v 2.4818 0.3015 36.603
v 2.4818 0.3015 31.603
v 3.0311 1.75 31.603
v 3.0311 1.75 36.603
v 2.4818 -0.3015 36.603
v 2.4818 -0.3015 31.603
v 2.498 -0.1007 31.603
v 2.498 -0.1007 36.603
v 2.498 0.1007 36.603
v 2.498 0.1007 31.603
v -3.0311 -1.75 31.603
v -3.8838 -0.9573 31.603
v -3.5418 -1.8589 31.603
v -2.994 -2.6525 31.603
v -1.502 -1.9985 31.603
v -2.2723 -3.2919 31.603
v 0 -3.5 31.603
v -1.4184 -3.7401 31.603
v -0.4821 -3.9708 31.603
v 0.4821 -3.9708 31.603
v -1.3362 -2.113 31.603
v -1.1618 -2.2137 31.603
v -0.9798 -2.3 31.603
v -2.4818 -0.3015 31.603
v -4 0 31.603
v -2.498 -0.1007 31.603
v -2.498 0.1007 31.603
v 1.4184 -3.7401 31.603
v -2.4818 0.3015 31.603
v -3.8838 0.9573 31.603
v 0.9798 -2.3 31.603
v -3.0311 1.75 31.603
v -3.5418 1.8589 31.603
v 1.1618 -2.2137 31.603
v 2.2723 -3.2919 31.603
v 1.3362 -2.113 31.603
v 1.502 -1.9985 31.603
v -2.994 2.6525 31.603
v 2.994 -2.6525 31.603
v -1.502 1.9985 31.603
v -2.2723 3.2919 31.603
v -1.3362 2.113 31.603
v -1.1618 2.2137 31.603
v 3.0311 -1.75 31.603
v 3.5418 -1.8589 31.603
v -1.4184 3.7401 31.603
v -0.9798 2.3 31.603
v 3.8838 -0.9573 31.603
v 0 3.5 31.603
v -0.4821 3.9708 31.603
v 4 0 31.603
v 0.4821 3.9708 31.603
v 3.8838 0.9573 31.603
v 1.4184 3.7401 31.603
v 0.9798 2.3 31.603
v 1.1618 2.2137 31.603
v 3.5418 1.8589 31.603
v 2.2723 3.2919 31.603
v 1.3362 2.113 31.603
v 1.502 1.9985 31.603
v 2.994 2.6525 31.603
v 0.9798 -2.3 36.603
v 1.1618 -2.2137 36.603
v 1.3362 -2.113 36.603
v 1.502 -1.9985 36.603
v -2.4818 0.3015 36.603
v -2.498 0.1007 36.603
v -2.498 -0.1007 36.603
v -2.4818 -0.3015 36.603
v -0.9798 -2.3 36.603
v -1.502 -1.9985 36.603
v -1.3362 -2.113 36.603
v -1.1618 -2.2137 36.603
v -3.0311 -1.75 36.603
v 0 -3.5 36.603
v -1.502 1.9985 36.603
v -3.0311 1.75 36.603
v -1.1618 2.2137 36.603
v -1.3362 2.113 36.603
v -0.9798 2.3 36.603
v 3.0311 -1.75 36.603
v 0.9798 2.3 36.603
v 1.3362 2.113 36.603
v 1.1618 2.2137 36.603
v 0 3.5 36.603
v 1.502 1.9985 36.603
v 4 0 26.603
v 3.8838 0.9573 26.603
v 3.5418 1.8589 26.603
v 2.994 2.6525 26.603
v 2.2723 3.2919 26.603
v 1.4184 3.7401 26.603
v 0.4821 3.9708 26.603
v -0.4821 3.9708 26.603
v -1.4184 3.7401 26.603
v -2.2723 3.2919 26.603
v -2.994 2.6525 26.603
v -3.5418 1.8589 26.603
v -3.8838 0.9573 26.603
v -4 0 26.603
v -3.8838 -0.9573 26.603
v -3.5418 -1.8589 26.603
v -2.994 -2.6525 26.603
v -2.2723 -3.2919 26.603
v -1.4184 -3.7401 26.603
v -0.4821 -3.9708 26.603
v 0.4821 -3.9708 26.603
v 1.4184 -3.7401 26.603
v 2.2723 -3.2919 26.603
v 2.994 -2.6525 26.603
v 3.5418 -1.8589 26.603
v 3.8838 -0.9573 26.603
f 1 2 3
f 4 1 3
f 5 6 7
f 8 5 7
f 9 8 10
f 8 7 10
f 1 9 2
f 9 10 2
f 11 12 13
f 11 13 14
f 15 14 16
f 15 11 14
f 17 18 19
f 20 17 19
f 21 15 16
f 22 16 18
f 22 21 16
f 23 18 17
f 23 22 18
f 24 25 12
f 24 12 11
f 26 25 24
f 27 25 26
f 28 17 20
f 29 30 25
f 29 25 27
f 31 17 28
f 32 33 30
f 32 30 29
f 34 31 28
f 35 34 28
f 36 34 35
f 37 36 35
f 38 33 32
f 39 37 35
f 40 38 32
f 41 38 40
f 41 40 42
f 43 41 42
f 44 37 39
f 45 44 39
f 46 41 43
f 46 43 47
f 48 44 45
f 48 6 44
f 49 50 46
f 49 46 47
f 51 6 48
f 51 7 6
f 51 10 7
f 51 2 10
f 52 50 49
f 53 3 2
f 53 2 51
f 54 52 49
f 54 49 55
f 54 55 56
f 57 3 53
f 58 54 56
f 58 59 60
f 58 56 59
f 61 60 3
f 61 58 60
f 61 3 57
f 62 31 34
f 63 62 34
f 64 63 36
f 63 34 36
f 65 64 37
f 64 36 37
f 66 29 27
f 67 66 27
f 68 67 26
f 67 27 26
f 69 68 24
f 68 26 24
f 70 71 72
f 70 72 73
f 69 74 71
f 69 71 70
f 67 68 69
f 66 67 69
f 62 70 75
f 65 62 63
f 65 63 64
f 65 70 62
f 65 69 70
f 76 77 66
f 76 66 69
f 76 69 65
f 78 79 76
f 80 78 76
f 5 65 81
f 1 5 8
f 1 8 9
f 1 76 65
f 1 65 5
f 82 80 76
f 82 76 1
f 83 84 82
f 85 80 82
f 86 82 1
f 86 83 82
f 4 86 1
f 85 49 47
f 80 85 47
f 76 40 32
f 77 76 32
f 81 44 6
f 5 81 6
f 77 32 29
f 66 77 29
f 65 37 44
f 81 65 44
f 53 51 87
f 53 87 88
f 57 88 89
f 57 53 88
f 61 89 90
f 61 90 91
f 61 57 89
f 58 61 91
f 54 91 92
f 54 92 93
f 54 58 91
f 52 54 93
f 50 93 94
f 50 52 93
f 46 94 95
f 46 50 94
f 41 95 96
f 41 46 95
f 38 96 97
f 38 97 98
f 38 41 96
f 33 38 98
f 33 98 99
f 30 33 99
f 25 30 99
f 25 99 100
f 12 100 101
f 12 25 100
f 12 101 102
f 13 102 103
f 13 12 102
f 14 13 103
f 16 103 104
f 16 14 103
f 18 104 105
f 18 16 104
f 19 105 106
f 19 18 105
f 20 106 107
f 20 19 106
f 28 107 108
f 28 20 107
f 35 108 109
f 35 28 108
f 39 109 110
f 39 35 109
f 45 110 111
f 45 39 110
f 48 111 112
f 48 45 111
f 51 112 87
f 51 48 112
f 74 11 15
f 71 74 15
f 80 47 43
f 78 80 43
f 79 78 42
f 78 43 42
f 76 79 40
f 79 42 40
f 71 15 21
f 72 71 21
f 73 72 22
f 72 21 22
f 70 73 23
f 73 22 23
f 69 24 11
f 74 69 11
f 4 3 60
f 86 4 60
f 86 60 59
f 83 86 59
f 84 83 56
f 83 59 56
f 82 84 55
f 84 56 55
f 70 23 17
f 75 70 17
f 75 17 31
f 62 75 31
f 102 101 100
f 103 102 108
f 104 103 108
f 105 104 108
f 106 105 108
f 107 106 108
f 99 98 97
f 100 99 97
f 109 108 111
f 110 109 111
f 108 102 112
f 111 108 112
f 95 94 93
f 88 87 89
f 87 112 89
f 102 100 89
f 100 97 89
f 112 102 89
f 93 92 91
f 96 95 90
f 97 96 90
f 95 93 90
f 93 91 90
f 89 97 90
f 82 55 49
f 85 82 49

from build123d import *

# Parameters (mm, degrees)
SKETCH_2_R      = 2.5
EXTRUDE_2_DEPTH = 5
SKETCH_3_R      = 4
EXTRUDE_4_DEPTH = 5


with BuildPart() as part:
    # Эскиз2 → Бобышка-Вытянуть2 (new body)
    with BuildSketch(Plane.XY.offset(31.602998)):
        with BuildLine():
            Line((0, 3.5), (-0.979795897, 2.3))
            ThreePointArc((-0.979795897, 2.3), (0, 2.5), (0.979795897, 2.3))
            Line((0.979795897, 2.3), (0, 3.5))
        make_face()
        with BuildLine():
            Line((3.031088913, 1.75), (1.50196048, 1.998528137))
            ThreePointArc((1.50196048, 1.998528137), (2.165063509, 1.25), (2.481756377, 0.301471863))
            Line((2.481756377, 0.301471863), (3.031088913, 1.75))
        make_face()
        with BuildLine():
            Line((3.031088913, -1.75), (2.481756377, -0.301471863))
            ThreePointArc((2.481756377, -0.301471863), (2.165063509, -1.25), (1.50196048, -1.998528137))
            Line((1.50196048, -1.998528137), (3.031088913, -1.75))
        make_face()
        with BuildLine():
            ThreePointArc((0.979795897, -2.3), (0, -2.5), (-0.979795897, -2.3))
            Line((-0.979795897, -2.3), (0, -3.5))
            Line((0, -3.5), (0.979795897, -2.3))
        make_face()
        with BuildLine():
            ThreePointArc((-2.481756377, 0.301471863), (-2.165063509, 1.25), (-1.50196048, 1.998528137))
            Line((-1.50196048, 1.998528137), (-3.031088913, 1.75))
            Line((-3.031088913, 1.75), (-2.481756377, 0.301471863))
        make_face()
        with BuildLine():
            ThreePointArc((-1.50196048, -1.998528137), (-2.165063509, -1.25), (-2.481756377, -0.301471863))
            Line((-2.481756377, -0.301471863), (-3.031088913, -1.75))
            Line((-3.031088913, -1.75), (-1.50196048, -1.998528137))
        make_face()
        Circle(SKETCH_2_R)
    extrude(amount=EXTRUDE_2_DEPTH)

    # Эскиз3 → Бобышка-Вытянуть4 (add)
    with BuildSketch(Plane.XY.offset(31.602998)):
        Circle(SKETCH_3_R)
    extrude(amount=-EXTRUDE_4_DEPTH)


solid = part.part
